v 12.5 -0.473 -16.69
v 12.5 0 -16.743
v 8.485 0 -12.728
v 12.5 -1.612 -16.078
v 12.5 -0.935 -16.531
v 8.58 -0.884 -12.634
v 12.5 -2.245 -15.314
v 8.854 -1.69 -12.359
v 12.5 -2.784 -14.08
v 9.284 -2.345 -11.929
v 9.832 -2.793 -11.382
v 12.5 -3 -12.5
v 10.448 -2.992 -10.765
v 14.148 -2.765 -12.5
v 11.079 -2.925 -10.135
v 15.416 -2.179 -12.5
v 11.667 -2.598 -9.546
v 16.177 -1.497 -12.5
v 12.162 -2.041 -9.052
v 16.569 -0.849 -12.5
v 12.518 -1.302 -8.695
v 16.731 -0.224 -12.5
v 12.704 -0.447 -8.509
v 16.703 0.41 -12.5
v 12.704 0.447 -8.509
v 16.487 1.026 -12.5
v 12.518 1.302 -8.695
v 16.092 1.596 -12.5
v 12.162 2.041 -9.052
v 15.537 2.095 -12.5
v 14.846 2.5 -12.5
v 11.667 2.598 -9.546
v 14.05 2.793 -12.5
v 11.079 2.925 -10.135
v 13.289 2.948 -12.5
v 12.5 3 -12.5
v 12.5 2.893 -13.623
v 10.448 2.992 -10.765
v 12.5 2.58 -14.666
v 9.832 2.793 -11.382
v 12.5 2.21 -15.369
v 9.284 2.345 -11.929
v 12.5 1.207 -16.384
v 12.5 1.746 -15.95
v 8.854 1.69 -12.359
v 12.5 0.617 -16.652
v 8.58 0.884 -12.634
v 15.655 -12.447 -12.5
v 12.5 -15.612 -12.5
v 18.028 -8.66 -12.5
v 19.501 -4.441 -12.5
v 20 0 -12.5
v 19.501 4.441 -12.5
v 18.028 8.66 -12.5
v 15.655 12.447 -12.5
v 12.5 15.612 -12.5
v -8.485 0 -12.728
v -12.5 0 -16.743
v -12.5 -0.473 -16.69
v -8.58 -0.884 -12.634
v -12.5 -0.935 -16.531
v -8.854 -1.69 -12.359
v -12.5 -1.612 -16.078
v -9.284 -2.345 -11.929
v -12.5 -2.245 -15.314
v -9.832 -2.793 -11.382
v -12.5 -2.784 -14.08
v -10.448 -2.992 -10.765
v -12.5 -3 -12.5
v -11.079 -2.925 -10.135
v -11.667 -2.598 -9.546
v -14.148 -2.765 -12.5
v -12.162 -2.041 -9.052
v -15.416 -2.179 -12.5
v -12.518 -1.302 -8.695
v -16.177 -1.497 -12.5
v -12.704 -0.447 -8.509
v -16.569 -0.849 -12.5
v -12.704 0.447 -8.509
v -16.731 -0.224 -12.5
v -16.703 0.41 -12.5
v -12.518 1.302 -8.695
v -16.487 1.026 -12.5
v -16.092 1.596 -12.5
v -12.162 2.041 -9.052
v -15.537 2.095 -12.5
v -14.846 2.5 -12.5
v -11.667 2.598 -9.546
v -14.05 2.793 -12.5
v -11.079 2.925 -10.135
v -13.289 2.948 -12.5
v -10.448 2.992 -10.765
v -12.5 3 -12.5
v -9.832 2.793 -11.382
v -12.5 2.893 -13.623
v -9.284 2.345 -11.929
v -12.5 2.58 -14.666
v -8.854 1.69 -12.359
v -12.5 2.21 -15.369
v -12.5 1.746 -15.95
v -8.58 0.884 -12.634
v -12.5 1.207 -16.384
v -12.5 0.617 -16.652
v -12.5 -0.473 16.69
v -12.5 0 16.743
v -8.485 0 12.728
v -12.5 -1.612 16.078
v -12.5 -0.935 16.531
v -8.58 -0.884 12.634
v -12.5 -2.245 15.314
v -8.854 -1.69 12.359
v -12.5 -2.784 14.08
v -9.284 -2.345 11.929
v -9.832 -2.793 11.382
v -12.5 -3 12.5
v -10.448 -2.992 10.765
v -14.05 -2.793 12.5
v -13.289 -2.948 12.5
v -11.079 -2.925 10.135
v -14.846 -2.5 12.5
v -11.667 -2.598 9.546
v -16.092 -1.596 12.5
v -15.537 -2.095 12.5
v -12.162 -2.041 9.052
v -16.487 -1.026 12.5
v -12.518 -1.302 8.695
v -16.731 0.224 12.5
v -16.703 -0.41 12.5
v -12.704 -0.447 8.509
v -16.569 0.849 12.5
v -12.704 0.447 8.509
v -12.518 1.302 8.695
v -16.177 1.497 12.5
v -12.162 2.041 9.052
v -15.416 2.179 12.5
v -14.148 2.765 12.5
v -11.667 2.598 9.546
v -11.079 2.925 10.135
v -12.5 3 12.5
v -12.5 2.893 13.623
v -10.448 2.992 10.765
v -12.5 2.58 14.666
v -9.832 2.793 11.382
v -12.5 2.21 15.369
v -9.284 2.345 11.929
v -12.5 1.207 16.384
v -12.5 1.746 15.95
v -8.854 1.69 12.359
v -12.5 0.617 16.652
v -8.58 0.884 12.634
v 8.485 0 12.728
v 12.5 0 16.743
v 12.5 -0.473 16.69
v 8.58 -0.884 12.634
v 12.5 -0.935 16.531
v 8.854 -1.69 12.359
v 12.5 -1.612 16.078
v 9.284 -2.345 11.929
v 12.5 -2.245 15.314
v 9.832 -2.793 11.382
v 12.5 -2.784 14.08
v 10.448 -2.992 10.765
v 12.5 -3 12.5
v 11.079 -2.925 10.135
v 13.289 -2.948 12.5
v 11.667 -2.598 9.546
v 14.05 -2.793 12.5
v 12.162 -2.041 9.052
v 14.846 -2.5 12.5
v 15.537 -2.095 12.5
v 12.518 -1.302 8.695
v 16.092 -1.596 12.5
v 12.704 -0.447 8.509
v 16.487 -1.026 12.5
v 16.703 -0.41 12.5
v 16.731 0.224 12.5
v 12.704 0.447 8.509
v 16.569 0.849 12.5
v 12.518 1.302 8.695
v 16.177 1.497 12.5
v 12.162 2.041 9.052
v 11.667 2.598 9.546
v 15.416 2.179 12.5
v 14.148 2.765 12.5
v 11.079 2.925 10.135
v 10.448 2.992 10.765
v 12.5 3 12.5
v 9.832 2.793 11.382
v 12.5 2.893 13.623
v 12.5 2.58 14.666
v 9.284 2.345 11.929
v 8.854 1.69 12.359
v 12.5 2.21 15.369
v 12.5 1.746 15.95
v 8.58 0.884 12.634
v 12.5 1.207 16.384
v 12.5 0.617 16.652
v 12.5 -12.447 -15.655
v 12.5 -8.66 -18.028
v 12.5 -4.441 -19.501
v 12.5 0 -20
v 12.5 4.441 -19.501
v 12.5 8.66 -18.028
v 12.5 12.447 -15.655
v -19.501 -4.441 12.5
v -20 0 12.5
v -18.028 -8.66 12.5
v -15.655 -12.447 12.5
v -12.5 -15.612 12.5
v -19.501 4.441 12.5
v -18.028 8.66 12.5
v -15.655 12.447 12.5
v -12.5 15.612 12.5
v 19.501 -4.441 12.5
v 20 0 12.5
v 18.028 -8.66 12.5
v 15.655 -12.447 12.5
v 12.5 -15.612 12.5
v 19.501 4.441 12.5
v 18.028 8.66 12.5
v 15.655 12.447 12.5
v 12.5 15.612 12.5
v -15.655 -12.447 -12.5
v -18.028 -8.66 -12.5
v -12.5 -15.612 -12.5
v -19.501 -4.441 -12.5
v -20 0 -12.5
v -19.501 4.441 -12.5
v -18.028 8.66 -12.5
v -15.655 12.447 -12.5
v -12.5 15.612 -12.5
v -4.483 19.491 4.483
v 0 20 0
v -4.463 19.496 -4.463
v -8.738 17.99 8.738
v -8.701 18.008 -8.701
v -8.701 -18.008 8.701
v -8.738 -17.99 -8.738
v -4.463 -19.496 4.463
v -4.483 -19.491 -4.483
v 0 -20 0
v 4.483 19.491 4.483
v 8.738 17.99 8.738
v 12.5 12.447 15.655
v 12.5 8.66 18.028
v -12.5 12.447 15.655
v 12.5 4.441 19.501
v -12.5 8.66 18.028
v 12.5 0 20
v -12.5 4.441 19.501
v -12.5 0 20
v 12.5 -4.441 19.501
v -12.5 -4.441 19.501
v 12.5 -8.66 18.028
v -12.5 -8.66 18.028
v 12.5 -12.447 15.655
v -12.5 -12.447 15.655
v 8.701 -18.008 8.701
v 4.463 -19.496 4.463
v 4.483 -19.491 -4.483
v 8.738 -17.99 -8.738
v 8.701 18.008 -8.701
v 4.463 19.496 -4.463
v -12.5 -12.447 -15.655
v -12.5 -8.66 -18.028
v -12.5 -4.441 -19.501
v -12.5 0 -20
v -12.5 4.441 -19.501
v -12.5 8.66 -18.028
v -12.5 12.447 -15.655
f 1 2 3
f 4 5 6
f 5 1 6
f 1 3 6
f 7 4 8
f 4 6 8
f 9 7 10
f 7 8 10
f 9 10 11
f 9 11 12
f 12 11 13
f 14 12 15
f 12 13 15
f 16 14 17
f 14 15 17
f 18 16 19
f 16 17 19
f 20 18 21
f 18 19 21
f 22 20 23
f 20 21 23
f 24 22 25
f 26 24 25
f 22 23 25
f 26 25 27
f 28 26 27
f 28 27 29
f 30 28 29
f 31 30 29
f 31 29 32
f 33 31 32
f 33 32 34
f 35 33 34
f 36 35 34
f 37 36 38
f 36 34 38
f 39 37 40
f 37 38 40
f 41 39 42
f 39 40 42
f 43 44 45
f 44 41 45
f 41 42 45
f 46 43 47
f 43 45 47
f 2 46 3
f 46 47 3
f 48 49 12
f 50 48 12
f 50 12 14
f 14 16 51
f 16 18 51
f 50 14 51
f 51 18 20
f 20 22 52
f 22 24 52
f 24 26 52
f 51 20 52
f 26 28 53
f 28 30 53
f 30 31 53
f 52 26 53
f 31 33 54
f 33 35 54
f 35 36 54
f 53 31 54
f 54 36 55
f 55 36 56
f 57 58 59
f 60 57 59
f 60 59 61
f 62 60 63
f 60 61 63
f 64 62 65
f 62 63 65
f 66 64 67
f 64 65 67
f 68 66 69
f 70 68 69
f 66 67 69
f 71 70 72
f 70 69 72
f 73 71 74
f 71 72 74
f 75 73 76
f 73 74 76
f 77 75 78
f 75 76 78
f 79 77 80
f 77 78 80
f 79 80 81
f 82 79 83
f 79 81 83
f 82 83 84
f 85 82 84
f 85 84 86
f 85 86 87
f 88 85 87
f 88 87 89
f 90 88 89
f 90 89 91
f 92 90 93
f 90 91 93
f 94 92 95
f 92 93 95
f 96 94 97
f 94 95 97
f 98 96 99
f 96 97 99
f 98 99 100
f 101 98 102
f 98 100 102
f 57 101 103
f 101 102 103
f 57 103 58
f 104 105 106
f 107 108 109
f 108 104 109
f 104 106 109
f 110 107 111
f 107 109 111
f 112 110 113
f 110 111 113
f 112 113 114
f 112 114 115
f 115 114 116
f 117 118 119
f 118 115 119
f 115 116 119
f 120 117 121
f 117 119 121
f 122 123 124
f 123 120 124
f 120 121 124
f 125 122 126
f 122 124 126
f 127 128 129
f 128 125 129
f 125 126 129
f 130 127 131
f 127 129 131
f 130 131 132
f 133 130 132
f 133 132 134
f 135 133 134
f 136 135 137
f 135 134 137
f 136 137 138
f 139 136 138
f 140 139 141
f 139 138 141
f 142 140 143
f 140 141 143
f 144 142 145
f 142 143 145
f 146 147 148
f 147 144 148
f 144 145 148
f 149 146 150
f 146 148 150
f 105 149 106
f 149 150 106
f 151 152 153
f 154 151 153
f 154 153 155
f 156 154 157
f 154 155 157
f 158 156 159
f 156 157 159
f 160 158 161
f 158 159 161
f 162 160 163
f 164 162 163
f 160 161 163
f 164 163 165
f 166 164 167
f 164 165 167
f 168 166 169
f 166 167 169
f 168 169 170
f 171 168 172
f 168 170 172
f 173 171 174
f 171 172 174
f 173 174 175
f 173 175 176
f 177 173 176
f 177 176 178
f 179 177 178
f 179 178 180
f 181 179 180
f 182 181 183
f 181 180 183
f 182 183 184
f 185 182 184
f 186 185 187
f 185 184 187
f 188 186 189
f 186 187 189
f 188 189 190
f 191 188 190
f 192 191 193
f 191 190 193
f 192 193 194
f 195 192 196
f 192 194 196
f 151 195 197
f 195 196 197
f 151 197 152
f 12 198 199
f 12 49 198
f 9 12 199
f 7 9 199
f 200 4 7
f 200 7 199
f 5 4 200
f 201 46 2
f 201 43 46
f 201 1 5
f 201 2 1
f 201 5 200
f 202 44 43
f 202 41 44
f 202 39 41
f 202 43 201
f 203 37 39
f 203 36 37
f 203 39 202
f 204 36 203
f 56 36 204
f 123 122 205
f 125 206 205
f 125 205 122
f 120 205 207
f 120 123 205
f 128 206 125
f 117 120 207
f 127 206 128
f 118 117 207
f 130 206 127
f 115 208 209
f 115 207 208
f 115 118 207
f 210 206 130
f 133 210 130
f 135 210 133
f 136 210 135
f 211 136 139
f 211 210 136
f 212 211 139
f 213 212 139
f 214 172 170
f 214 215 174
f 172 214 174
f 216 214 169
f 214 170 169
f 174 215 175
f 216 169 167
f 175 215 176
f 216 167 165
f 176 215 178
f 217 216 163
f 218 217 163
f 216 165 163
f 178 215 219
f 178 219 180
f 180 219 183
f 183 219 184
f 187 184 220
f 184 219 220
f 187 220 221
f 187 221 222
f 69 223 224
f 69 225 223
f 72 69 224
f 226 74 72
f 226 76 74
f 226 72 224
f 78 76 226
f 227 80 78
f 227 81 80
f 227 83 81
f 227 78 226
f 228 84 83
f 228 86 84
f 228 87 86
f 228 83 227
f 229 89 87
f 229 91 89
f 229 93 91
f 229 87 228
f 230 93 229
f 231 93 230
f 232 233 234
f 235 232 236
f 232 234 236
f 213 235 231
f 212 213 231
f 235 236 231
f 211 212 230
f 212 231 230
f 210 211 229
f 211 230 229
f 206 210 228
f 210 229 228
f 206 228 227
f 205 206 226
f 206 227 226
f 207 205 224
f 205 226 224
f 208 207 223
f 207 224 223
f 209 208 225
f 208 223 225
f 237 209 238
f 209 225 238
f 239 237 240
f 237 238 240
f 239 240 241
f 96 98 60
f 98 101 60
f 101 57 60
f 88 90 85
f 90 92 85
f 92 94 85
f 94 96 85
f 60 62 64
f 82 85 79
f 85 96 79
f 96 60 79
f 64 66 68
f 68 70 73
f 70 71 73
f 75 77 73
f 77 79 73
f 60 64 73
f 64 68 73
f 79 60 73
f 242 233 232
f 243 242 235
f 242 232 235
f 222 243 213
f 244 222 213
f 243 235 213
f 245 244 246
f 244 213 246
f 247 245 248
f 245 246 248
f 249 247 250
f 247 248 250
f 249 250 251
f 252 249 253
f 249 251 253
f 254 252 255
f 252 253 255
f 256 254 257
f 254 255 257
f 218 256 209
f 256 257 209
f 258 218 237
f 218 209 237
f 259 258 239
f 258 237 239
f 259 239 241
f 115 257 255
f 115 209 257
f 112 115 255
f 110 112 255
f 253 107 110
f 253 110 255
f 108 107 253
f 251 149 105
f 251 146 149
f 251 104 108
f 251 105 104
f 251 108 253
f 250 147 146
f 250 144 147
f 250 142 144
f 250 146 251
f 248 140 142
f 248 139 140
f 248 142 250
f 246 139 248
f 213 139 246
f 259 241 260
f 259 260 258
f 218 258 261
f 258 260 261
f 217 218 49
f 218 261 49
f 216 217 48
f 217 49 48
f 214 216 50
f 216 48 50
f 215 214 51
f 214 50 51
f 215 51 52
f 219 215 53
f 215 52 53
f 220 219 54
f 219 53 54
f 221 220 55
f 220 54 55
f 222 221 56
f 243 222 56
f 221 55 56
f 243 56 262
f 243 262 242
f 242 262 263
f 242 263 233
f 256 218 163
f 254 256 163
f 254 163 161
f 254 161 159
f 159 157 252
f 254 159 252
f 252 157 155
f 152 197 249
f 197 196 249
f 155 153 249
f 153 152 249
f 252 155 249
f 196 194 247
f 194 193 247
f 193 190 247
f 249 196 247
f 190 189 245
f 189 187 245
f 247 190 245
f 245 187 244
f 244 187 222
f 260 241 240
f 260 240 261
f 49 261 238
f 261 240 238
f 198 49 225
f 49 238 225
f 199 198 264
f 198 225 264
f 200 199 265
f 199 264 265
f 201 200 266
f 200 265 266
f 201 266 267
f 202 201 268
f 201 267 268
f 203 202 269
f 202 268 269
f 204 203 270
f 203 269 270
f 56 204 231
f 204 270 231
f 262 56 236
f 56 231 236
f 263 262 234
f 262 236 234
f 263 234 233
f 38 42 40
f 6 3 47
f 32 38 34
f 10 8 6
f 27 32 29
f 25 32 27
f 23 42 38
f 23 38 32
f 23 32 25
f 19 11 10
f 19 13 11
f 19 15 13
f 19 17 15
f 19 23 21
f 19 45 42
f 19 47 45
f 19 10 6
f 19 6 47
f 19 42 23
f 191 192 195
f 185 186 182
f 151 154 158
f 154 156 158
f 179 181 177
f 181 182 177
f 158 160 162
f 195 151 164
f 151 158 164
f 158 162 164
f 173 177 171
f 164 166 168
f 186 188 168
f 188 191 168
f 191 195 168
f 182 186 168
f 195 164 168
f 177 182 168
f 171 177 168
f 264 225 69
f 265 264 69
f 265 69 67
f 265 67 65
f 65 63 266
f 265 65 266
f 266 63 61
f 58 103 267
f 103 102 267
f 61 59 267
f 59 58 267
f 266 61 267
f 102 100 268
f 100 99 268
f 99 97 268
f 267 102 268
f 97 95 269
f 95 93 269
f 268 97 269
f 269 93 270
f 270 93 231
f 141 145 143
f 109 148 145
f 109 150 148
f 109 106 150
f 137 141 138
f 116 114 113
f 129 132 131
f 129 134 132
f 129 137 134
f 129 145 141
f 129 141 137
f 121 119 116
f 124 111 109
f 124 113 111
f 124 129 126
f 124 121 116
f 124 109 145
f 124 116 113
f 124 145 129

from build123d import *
from OCP.BRepAlgoAPI import BRepAlgoAPI_Cut
from OCP.TopTools import TopTools_ListOfShape

# Parameters (mm, degrees)
CUT_EXTRUDE_2_DEPTH      = 59.108987417
CUT_EXTRUDE_2_DEPTH_BACK = 59.108987417
SKETCH_6_W               = 109.700764472
SKETCH_6_H               = 102.082655829
SKETCH_6_W_2             = 40
SKETCH_6_H_2             = 40
SKETCH_7_W               = 10.430230832
SKETCH_7_H               = 9.900213331
CUT_EXTRUDE_3_DEPTH      = 66.9796091
SKETCH_8_W               = 20.261670598
SKETCH_8_H               = 3
SKETCH_9_W               = 20.800473715
SKETCH_9_H               = 3
SKETCH_11_W              = 20.381404624
SKETCH_11_H              = 3
SKETCH_12_W              = 21.399143843
SKETCH_12_H              = 3


with BuildPart() as part:
    # 草图3 → 旋转1 (revolve)
    with BuildSketch(Plane(origin=(0, 0, 0), x_dir=(0, 0, -1), z_dir=(1, 0, 0))):
        with BuildLine():
            Line((0, 40), (0, -40))
            ThreePointArc((0, -40), (40, 0), (0, 40))
        make_face()
    revolve(axis=Axis((0, 40, 0), (0, -1, 0)))

    # 草图4 → 切除-旋转3 (revolve, cut)
    with BuildSketch(Plane.XY):
        Polygon((-25, 50), (25, 50), (12.5, 20), (-12.5, 20), align=None)
    revolve(axis=Axis((-55.247864245, 0, 0), (1, 0, 0)), mode=Mode.SUBTRACT)


with BuildPart() as cut_revolve_4_tool:
    # 草图5 → 切除-旋转4 (revolve)
    with BuildSketch(Plane(origin=(0, 0, 0), x_dir=(1, 0, 0), z_dir=(0, 1, 0))):
        Polygon((-50, 25), (-50, -25), (-20, -12.5), (-20, 12.5), align=None)
    revolve(axis=Axis((0, 0, -44.002313129), (0, 0, 1)))


with BuildPart() as part_1:
    add(part.part)

    # 切除-旋转4: cut by cut_revolve_4_tool, with a tolerance
    cut_revolve_4_stock = TopTools_ListOfShape()
    cut_revolve_4_stock.Append(part_1.part.wrapped)
    cut_revolve_4_tools = TopTools_ListOfShape()
    cut_revolve_4_tools.Append(cut_revolve_4_tool.part.wrapped)
    cut_revolve_4_cut = BRepAlgoAPI_Cut()
    cut_revolve_4_cut.SetArguments(cut_revolve_4_stock)
    cut_revolve_4_cut.SetTools(cut_revolve_4_tools)
    cut_revolve_4_cut.SetFuzzyValue(0.00001)
    cut_revolve_4_cut.Build()
    add(Compound.cast(cut_revolve_4_cut.Shape()).solids(), mode=Mode.REPLACE)

    # 草图6 → 切除-拉伸2 (cut, two sides: drawn at the far end of the back side and taken through both)
    with BuildSketch(Plane(origin=(0, 0, 0), x_dir=(1, 0, 0), z_dir=(0, 1, 0)).offset(-CUT_EXTRUDE_2_DEPTH_BACK)):
        with Locations((-5.024851986, -5.217653308)):
            Rectangle(SKETCH_6_W, SKETCH_6_H)
        Rectangle(SKETCH_6_W_2, SKETCH_6_H_2, mode=Mode.SUBTRACT)
    extrude(amount=CUT_EXTRUDE_2_DEPTH + CUT_EXTRUDE_2_DEPTH_BACK, mode=Mode.SUBTRACT)

    # 草图7 → 切除-拉伸3 (cut, through all)
    with BuildSketch(Plane(origin=(0, 29.80481839, 0), x_dir=(1, 0, 0), z_dir=(0, 1, 0))):
        Polygon((-12.5, 20), (-12.5, 12.5), (-20, 12.5), (-20, 22.400213331), (-12.5, 22.400213331), align=None)
        with Locations((17.715115416, 17.450106666)):
            Rectangle(SKETCH_7_W, SKETCH_7_H)
        Polygon((-12.5, -12.5), (-12.5, -22.2886307), (-23.264978728, -21.674926225), (-21.87019583, -13.864142), (-20, -12.5), align=None)
        Polygon((12.5, -12.5), (12.5, -20), (16.291064241, -21.981778462), (20, -20), (23.264978728, -15.681813192), (21.632489364, -12.626578567), (20, -12.5), align=None)
    extrude(amount=-CUT_EXTRUDE_3_DEPTH, mode=Mode.SUBTRACT)

    # 草图8 → 切除-旋转5 (revolve, cut)
    with BuildSketch(Plane(origin=(0, 0, 0), x_dir=(-0.7071067811865477, 0, -0.7071067811865475), z_dir=(0.7071067811865475, 0, -0.7071067811865477))):
        with Locations((25.130835299, 1.5)):
            Rectangle(SKETCH_8_W, SKETCH_8_H)
    revolve(axis=Axis((17.737263362, 0, 17.737263362), (-0.7071067811865476, 0, -0.7071067811865475)), mode=Mode.SUBTRACT)

    # 草图9 → 切除-旋转6 (revolve, cut)
    with BuildSketch(Plane(origin=(0, 0, 0), x_dir=(-0.7071067811865477, 0, 0.7071067811865475), z_dir=(-0.7071067811865475, 0, -0.7071067811865477))):
        with Locations((-25.400236858, 1.5)):
            Rectangle(SKETCH_9_W, SKETCH_9_H)
    revolve(axis=Axis((17.65259862, 0, -17.65259862), (-0.7071067811865477, 0, 0.7071067811865475)), mode=Mode.SUBTRACT)

    # 草图11 → 切除-旋转10 (revolve, cut)
    with BuildSketch(Plane(origin=(0, 0, 0), x_dir=(0.7071067811865476, 0, -0.7071067811865475), z_dir=(0.7071067811865475, 0, 0.7071067811865476))):
        with Locations((-25.190702312, 1.5)):
            Rectangle(SKETCH_11_W, SKETCH_11_H)
    revolve(axis=Axis((-18.922569744, 0, 18.922569744), (0.7071067811865476, 0, -0.7071067811865475)), mode=Mode.SUBTRACT)

    # 草图12 → 切除-旋转11 (revolve, cut)
    with BuildSketch(Plane(origin=(0, 0, 0), x_dir=(0.7071067811865477, 0, 0.7071067811865475), z_dir=(-0.7071067811865475, 0, 0.7071067811865477))):
        with Locations((25.699571922, 1.5)):
            Rectangle(SKETCH_12_W, SKETCH_12_H)
    revolve(axis=Axis((0, 0, 0), (0.7071067811865477, 0, 0.7071067811865475)), mode=Mode.SUBTRACT)


solid = part_1.part
